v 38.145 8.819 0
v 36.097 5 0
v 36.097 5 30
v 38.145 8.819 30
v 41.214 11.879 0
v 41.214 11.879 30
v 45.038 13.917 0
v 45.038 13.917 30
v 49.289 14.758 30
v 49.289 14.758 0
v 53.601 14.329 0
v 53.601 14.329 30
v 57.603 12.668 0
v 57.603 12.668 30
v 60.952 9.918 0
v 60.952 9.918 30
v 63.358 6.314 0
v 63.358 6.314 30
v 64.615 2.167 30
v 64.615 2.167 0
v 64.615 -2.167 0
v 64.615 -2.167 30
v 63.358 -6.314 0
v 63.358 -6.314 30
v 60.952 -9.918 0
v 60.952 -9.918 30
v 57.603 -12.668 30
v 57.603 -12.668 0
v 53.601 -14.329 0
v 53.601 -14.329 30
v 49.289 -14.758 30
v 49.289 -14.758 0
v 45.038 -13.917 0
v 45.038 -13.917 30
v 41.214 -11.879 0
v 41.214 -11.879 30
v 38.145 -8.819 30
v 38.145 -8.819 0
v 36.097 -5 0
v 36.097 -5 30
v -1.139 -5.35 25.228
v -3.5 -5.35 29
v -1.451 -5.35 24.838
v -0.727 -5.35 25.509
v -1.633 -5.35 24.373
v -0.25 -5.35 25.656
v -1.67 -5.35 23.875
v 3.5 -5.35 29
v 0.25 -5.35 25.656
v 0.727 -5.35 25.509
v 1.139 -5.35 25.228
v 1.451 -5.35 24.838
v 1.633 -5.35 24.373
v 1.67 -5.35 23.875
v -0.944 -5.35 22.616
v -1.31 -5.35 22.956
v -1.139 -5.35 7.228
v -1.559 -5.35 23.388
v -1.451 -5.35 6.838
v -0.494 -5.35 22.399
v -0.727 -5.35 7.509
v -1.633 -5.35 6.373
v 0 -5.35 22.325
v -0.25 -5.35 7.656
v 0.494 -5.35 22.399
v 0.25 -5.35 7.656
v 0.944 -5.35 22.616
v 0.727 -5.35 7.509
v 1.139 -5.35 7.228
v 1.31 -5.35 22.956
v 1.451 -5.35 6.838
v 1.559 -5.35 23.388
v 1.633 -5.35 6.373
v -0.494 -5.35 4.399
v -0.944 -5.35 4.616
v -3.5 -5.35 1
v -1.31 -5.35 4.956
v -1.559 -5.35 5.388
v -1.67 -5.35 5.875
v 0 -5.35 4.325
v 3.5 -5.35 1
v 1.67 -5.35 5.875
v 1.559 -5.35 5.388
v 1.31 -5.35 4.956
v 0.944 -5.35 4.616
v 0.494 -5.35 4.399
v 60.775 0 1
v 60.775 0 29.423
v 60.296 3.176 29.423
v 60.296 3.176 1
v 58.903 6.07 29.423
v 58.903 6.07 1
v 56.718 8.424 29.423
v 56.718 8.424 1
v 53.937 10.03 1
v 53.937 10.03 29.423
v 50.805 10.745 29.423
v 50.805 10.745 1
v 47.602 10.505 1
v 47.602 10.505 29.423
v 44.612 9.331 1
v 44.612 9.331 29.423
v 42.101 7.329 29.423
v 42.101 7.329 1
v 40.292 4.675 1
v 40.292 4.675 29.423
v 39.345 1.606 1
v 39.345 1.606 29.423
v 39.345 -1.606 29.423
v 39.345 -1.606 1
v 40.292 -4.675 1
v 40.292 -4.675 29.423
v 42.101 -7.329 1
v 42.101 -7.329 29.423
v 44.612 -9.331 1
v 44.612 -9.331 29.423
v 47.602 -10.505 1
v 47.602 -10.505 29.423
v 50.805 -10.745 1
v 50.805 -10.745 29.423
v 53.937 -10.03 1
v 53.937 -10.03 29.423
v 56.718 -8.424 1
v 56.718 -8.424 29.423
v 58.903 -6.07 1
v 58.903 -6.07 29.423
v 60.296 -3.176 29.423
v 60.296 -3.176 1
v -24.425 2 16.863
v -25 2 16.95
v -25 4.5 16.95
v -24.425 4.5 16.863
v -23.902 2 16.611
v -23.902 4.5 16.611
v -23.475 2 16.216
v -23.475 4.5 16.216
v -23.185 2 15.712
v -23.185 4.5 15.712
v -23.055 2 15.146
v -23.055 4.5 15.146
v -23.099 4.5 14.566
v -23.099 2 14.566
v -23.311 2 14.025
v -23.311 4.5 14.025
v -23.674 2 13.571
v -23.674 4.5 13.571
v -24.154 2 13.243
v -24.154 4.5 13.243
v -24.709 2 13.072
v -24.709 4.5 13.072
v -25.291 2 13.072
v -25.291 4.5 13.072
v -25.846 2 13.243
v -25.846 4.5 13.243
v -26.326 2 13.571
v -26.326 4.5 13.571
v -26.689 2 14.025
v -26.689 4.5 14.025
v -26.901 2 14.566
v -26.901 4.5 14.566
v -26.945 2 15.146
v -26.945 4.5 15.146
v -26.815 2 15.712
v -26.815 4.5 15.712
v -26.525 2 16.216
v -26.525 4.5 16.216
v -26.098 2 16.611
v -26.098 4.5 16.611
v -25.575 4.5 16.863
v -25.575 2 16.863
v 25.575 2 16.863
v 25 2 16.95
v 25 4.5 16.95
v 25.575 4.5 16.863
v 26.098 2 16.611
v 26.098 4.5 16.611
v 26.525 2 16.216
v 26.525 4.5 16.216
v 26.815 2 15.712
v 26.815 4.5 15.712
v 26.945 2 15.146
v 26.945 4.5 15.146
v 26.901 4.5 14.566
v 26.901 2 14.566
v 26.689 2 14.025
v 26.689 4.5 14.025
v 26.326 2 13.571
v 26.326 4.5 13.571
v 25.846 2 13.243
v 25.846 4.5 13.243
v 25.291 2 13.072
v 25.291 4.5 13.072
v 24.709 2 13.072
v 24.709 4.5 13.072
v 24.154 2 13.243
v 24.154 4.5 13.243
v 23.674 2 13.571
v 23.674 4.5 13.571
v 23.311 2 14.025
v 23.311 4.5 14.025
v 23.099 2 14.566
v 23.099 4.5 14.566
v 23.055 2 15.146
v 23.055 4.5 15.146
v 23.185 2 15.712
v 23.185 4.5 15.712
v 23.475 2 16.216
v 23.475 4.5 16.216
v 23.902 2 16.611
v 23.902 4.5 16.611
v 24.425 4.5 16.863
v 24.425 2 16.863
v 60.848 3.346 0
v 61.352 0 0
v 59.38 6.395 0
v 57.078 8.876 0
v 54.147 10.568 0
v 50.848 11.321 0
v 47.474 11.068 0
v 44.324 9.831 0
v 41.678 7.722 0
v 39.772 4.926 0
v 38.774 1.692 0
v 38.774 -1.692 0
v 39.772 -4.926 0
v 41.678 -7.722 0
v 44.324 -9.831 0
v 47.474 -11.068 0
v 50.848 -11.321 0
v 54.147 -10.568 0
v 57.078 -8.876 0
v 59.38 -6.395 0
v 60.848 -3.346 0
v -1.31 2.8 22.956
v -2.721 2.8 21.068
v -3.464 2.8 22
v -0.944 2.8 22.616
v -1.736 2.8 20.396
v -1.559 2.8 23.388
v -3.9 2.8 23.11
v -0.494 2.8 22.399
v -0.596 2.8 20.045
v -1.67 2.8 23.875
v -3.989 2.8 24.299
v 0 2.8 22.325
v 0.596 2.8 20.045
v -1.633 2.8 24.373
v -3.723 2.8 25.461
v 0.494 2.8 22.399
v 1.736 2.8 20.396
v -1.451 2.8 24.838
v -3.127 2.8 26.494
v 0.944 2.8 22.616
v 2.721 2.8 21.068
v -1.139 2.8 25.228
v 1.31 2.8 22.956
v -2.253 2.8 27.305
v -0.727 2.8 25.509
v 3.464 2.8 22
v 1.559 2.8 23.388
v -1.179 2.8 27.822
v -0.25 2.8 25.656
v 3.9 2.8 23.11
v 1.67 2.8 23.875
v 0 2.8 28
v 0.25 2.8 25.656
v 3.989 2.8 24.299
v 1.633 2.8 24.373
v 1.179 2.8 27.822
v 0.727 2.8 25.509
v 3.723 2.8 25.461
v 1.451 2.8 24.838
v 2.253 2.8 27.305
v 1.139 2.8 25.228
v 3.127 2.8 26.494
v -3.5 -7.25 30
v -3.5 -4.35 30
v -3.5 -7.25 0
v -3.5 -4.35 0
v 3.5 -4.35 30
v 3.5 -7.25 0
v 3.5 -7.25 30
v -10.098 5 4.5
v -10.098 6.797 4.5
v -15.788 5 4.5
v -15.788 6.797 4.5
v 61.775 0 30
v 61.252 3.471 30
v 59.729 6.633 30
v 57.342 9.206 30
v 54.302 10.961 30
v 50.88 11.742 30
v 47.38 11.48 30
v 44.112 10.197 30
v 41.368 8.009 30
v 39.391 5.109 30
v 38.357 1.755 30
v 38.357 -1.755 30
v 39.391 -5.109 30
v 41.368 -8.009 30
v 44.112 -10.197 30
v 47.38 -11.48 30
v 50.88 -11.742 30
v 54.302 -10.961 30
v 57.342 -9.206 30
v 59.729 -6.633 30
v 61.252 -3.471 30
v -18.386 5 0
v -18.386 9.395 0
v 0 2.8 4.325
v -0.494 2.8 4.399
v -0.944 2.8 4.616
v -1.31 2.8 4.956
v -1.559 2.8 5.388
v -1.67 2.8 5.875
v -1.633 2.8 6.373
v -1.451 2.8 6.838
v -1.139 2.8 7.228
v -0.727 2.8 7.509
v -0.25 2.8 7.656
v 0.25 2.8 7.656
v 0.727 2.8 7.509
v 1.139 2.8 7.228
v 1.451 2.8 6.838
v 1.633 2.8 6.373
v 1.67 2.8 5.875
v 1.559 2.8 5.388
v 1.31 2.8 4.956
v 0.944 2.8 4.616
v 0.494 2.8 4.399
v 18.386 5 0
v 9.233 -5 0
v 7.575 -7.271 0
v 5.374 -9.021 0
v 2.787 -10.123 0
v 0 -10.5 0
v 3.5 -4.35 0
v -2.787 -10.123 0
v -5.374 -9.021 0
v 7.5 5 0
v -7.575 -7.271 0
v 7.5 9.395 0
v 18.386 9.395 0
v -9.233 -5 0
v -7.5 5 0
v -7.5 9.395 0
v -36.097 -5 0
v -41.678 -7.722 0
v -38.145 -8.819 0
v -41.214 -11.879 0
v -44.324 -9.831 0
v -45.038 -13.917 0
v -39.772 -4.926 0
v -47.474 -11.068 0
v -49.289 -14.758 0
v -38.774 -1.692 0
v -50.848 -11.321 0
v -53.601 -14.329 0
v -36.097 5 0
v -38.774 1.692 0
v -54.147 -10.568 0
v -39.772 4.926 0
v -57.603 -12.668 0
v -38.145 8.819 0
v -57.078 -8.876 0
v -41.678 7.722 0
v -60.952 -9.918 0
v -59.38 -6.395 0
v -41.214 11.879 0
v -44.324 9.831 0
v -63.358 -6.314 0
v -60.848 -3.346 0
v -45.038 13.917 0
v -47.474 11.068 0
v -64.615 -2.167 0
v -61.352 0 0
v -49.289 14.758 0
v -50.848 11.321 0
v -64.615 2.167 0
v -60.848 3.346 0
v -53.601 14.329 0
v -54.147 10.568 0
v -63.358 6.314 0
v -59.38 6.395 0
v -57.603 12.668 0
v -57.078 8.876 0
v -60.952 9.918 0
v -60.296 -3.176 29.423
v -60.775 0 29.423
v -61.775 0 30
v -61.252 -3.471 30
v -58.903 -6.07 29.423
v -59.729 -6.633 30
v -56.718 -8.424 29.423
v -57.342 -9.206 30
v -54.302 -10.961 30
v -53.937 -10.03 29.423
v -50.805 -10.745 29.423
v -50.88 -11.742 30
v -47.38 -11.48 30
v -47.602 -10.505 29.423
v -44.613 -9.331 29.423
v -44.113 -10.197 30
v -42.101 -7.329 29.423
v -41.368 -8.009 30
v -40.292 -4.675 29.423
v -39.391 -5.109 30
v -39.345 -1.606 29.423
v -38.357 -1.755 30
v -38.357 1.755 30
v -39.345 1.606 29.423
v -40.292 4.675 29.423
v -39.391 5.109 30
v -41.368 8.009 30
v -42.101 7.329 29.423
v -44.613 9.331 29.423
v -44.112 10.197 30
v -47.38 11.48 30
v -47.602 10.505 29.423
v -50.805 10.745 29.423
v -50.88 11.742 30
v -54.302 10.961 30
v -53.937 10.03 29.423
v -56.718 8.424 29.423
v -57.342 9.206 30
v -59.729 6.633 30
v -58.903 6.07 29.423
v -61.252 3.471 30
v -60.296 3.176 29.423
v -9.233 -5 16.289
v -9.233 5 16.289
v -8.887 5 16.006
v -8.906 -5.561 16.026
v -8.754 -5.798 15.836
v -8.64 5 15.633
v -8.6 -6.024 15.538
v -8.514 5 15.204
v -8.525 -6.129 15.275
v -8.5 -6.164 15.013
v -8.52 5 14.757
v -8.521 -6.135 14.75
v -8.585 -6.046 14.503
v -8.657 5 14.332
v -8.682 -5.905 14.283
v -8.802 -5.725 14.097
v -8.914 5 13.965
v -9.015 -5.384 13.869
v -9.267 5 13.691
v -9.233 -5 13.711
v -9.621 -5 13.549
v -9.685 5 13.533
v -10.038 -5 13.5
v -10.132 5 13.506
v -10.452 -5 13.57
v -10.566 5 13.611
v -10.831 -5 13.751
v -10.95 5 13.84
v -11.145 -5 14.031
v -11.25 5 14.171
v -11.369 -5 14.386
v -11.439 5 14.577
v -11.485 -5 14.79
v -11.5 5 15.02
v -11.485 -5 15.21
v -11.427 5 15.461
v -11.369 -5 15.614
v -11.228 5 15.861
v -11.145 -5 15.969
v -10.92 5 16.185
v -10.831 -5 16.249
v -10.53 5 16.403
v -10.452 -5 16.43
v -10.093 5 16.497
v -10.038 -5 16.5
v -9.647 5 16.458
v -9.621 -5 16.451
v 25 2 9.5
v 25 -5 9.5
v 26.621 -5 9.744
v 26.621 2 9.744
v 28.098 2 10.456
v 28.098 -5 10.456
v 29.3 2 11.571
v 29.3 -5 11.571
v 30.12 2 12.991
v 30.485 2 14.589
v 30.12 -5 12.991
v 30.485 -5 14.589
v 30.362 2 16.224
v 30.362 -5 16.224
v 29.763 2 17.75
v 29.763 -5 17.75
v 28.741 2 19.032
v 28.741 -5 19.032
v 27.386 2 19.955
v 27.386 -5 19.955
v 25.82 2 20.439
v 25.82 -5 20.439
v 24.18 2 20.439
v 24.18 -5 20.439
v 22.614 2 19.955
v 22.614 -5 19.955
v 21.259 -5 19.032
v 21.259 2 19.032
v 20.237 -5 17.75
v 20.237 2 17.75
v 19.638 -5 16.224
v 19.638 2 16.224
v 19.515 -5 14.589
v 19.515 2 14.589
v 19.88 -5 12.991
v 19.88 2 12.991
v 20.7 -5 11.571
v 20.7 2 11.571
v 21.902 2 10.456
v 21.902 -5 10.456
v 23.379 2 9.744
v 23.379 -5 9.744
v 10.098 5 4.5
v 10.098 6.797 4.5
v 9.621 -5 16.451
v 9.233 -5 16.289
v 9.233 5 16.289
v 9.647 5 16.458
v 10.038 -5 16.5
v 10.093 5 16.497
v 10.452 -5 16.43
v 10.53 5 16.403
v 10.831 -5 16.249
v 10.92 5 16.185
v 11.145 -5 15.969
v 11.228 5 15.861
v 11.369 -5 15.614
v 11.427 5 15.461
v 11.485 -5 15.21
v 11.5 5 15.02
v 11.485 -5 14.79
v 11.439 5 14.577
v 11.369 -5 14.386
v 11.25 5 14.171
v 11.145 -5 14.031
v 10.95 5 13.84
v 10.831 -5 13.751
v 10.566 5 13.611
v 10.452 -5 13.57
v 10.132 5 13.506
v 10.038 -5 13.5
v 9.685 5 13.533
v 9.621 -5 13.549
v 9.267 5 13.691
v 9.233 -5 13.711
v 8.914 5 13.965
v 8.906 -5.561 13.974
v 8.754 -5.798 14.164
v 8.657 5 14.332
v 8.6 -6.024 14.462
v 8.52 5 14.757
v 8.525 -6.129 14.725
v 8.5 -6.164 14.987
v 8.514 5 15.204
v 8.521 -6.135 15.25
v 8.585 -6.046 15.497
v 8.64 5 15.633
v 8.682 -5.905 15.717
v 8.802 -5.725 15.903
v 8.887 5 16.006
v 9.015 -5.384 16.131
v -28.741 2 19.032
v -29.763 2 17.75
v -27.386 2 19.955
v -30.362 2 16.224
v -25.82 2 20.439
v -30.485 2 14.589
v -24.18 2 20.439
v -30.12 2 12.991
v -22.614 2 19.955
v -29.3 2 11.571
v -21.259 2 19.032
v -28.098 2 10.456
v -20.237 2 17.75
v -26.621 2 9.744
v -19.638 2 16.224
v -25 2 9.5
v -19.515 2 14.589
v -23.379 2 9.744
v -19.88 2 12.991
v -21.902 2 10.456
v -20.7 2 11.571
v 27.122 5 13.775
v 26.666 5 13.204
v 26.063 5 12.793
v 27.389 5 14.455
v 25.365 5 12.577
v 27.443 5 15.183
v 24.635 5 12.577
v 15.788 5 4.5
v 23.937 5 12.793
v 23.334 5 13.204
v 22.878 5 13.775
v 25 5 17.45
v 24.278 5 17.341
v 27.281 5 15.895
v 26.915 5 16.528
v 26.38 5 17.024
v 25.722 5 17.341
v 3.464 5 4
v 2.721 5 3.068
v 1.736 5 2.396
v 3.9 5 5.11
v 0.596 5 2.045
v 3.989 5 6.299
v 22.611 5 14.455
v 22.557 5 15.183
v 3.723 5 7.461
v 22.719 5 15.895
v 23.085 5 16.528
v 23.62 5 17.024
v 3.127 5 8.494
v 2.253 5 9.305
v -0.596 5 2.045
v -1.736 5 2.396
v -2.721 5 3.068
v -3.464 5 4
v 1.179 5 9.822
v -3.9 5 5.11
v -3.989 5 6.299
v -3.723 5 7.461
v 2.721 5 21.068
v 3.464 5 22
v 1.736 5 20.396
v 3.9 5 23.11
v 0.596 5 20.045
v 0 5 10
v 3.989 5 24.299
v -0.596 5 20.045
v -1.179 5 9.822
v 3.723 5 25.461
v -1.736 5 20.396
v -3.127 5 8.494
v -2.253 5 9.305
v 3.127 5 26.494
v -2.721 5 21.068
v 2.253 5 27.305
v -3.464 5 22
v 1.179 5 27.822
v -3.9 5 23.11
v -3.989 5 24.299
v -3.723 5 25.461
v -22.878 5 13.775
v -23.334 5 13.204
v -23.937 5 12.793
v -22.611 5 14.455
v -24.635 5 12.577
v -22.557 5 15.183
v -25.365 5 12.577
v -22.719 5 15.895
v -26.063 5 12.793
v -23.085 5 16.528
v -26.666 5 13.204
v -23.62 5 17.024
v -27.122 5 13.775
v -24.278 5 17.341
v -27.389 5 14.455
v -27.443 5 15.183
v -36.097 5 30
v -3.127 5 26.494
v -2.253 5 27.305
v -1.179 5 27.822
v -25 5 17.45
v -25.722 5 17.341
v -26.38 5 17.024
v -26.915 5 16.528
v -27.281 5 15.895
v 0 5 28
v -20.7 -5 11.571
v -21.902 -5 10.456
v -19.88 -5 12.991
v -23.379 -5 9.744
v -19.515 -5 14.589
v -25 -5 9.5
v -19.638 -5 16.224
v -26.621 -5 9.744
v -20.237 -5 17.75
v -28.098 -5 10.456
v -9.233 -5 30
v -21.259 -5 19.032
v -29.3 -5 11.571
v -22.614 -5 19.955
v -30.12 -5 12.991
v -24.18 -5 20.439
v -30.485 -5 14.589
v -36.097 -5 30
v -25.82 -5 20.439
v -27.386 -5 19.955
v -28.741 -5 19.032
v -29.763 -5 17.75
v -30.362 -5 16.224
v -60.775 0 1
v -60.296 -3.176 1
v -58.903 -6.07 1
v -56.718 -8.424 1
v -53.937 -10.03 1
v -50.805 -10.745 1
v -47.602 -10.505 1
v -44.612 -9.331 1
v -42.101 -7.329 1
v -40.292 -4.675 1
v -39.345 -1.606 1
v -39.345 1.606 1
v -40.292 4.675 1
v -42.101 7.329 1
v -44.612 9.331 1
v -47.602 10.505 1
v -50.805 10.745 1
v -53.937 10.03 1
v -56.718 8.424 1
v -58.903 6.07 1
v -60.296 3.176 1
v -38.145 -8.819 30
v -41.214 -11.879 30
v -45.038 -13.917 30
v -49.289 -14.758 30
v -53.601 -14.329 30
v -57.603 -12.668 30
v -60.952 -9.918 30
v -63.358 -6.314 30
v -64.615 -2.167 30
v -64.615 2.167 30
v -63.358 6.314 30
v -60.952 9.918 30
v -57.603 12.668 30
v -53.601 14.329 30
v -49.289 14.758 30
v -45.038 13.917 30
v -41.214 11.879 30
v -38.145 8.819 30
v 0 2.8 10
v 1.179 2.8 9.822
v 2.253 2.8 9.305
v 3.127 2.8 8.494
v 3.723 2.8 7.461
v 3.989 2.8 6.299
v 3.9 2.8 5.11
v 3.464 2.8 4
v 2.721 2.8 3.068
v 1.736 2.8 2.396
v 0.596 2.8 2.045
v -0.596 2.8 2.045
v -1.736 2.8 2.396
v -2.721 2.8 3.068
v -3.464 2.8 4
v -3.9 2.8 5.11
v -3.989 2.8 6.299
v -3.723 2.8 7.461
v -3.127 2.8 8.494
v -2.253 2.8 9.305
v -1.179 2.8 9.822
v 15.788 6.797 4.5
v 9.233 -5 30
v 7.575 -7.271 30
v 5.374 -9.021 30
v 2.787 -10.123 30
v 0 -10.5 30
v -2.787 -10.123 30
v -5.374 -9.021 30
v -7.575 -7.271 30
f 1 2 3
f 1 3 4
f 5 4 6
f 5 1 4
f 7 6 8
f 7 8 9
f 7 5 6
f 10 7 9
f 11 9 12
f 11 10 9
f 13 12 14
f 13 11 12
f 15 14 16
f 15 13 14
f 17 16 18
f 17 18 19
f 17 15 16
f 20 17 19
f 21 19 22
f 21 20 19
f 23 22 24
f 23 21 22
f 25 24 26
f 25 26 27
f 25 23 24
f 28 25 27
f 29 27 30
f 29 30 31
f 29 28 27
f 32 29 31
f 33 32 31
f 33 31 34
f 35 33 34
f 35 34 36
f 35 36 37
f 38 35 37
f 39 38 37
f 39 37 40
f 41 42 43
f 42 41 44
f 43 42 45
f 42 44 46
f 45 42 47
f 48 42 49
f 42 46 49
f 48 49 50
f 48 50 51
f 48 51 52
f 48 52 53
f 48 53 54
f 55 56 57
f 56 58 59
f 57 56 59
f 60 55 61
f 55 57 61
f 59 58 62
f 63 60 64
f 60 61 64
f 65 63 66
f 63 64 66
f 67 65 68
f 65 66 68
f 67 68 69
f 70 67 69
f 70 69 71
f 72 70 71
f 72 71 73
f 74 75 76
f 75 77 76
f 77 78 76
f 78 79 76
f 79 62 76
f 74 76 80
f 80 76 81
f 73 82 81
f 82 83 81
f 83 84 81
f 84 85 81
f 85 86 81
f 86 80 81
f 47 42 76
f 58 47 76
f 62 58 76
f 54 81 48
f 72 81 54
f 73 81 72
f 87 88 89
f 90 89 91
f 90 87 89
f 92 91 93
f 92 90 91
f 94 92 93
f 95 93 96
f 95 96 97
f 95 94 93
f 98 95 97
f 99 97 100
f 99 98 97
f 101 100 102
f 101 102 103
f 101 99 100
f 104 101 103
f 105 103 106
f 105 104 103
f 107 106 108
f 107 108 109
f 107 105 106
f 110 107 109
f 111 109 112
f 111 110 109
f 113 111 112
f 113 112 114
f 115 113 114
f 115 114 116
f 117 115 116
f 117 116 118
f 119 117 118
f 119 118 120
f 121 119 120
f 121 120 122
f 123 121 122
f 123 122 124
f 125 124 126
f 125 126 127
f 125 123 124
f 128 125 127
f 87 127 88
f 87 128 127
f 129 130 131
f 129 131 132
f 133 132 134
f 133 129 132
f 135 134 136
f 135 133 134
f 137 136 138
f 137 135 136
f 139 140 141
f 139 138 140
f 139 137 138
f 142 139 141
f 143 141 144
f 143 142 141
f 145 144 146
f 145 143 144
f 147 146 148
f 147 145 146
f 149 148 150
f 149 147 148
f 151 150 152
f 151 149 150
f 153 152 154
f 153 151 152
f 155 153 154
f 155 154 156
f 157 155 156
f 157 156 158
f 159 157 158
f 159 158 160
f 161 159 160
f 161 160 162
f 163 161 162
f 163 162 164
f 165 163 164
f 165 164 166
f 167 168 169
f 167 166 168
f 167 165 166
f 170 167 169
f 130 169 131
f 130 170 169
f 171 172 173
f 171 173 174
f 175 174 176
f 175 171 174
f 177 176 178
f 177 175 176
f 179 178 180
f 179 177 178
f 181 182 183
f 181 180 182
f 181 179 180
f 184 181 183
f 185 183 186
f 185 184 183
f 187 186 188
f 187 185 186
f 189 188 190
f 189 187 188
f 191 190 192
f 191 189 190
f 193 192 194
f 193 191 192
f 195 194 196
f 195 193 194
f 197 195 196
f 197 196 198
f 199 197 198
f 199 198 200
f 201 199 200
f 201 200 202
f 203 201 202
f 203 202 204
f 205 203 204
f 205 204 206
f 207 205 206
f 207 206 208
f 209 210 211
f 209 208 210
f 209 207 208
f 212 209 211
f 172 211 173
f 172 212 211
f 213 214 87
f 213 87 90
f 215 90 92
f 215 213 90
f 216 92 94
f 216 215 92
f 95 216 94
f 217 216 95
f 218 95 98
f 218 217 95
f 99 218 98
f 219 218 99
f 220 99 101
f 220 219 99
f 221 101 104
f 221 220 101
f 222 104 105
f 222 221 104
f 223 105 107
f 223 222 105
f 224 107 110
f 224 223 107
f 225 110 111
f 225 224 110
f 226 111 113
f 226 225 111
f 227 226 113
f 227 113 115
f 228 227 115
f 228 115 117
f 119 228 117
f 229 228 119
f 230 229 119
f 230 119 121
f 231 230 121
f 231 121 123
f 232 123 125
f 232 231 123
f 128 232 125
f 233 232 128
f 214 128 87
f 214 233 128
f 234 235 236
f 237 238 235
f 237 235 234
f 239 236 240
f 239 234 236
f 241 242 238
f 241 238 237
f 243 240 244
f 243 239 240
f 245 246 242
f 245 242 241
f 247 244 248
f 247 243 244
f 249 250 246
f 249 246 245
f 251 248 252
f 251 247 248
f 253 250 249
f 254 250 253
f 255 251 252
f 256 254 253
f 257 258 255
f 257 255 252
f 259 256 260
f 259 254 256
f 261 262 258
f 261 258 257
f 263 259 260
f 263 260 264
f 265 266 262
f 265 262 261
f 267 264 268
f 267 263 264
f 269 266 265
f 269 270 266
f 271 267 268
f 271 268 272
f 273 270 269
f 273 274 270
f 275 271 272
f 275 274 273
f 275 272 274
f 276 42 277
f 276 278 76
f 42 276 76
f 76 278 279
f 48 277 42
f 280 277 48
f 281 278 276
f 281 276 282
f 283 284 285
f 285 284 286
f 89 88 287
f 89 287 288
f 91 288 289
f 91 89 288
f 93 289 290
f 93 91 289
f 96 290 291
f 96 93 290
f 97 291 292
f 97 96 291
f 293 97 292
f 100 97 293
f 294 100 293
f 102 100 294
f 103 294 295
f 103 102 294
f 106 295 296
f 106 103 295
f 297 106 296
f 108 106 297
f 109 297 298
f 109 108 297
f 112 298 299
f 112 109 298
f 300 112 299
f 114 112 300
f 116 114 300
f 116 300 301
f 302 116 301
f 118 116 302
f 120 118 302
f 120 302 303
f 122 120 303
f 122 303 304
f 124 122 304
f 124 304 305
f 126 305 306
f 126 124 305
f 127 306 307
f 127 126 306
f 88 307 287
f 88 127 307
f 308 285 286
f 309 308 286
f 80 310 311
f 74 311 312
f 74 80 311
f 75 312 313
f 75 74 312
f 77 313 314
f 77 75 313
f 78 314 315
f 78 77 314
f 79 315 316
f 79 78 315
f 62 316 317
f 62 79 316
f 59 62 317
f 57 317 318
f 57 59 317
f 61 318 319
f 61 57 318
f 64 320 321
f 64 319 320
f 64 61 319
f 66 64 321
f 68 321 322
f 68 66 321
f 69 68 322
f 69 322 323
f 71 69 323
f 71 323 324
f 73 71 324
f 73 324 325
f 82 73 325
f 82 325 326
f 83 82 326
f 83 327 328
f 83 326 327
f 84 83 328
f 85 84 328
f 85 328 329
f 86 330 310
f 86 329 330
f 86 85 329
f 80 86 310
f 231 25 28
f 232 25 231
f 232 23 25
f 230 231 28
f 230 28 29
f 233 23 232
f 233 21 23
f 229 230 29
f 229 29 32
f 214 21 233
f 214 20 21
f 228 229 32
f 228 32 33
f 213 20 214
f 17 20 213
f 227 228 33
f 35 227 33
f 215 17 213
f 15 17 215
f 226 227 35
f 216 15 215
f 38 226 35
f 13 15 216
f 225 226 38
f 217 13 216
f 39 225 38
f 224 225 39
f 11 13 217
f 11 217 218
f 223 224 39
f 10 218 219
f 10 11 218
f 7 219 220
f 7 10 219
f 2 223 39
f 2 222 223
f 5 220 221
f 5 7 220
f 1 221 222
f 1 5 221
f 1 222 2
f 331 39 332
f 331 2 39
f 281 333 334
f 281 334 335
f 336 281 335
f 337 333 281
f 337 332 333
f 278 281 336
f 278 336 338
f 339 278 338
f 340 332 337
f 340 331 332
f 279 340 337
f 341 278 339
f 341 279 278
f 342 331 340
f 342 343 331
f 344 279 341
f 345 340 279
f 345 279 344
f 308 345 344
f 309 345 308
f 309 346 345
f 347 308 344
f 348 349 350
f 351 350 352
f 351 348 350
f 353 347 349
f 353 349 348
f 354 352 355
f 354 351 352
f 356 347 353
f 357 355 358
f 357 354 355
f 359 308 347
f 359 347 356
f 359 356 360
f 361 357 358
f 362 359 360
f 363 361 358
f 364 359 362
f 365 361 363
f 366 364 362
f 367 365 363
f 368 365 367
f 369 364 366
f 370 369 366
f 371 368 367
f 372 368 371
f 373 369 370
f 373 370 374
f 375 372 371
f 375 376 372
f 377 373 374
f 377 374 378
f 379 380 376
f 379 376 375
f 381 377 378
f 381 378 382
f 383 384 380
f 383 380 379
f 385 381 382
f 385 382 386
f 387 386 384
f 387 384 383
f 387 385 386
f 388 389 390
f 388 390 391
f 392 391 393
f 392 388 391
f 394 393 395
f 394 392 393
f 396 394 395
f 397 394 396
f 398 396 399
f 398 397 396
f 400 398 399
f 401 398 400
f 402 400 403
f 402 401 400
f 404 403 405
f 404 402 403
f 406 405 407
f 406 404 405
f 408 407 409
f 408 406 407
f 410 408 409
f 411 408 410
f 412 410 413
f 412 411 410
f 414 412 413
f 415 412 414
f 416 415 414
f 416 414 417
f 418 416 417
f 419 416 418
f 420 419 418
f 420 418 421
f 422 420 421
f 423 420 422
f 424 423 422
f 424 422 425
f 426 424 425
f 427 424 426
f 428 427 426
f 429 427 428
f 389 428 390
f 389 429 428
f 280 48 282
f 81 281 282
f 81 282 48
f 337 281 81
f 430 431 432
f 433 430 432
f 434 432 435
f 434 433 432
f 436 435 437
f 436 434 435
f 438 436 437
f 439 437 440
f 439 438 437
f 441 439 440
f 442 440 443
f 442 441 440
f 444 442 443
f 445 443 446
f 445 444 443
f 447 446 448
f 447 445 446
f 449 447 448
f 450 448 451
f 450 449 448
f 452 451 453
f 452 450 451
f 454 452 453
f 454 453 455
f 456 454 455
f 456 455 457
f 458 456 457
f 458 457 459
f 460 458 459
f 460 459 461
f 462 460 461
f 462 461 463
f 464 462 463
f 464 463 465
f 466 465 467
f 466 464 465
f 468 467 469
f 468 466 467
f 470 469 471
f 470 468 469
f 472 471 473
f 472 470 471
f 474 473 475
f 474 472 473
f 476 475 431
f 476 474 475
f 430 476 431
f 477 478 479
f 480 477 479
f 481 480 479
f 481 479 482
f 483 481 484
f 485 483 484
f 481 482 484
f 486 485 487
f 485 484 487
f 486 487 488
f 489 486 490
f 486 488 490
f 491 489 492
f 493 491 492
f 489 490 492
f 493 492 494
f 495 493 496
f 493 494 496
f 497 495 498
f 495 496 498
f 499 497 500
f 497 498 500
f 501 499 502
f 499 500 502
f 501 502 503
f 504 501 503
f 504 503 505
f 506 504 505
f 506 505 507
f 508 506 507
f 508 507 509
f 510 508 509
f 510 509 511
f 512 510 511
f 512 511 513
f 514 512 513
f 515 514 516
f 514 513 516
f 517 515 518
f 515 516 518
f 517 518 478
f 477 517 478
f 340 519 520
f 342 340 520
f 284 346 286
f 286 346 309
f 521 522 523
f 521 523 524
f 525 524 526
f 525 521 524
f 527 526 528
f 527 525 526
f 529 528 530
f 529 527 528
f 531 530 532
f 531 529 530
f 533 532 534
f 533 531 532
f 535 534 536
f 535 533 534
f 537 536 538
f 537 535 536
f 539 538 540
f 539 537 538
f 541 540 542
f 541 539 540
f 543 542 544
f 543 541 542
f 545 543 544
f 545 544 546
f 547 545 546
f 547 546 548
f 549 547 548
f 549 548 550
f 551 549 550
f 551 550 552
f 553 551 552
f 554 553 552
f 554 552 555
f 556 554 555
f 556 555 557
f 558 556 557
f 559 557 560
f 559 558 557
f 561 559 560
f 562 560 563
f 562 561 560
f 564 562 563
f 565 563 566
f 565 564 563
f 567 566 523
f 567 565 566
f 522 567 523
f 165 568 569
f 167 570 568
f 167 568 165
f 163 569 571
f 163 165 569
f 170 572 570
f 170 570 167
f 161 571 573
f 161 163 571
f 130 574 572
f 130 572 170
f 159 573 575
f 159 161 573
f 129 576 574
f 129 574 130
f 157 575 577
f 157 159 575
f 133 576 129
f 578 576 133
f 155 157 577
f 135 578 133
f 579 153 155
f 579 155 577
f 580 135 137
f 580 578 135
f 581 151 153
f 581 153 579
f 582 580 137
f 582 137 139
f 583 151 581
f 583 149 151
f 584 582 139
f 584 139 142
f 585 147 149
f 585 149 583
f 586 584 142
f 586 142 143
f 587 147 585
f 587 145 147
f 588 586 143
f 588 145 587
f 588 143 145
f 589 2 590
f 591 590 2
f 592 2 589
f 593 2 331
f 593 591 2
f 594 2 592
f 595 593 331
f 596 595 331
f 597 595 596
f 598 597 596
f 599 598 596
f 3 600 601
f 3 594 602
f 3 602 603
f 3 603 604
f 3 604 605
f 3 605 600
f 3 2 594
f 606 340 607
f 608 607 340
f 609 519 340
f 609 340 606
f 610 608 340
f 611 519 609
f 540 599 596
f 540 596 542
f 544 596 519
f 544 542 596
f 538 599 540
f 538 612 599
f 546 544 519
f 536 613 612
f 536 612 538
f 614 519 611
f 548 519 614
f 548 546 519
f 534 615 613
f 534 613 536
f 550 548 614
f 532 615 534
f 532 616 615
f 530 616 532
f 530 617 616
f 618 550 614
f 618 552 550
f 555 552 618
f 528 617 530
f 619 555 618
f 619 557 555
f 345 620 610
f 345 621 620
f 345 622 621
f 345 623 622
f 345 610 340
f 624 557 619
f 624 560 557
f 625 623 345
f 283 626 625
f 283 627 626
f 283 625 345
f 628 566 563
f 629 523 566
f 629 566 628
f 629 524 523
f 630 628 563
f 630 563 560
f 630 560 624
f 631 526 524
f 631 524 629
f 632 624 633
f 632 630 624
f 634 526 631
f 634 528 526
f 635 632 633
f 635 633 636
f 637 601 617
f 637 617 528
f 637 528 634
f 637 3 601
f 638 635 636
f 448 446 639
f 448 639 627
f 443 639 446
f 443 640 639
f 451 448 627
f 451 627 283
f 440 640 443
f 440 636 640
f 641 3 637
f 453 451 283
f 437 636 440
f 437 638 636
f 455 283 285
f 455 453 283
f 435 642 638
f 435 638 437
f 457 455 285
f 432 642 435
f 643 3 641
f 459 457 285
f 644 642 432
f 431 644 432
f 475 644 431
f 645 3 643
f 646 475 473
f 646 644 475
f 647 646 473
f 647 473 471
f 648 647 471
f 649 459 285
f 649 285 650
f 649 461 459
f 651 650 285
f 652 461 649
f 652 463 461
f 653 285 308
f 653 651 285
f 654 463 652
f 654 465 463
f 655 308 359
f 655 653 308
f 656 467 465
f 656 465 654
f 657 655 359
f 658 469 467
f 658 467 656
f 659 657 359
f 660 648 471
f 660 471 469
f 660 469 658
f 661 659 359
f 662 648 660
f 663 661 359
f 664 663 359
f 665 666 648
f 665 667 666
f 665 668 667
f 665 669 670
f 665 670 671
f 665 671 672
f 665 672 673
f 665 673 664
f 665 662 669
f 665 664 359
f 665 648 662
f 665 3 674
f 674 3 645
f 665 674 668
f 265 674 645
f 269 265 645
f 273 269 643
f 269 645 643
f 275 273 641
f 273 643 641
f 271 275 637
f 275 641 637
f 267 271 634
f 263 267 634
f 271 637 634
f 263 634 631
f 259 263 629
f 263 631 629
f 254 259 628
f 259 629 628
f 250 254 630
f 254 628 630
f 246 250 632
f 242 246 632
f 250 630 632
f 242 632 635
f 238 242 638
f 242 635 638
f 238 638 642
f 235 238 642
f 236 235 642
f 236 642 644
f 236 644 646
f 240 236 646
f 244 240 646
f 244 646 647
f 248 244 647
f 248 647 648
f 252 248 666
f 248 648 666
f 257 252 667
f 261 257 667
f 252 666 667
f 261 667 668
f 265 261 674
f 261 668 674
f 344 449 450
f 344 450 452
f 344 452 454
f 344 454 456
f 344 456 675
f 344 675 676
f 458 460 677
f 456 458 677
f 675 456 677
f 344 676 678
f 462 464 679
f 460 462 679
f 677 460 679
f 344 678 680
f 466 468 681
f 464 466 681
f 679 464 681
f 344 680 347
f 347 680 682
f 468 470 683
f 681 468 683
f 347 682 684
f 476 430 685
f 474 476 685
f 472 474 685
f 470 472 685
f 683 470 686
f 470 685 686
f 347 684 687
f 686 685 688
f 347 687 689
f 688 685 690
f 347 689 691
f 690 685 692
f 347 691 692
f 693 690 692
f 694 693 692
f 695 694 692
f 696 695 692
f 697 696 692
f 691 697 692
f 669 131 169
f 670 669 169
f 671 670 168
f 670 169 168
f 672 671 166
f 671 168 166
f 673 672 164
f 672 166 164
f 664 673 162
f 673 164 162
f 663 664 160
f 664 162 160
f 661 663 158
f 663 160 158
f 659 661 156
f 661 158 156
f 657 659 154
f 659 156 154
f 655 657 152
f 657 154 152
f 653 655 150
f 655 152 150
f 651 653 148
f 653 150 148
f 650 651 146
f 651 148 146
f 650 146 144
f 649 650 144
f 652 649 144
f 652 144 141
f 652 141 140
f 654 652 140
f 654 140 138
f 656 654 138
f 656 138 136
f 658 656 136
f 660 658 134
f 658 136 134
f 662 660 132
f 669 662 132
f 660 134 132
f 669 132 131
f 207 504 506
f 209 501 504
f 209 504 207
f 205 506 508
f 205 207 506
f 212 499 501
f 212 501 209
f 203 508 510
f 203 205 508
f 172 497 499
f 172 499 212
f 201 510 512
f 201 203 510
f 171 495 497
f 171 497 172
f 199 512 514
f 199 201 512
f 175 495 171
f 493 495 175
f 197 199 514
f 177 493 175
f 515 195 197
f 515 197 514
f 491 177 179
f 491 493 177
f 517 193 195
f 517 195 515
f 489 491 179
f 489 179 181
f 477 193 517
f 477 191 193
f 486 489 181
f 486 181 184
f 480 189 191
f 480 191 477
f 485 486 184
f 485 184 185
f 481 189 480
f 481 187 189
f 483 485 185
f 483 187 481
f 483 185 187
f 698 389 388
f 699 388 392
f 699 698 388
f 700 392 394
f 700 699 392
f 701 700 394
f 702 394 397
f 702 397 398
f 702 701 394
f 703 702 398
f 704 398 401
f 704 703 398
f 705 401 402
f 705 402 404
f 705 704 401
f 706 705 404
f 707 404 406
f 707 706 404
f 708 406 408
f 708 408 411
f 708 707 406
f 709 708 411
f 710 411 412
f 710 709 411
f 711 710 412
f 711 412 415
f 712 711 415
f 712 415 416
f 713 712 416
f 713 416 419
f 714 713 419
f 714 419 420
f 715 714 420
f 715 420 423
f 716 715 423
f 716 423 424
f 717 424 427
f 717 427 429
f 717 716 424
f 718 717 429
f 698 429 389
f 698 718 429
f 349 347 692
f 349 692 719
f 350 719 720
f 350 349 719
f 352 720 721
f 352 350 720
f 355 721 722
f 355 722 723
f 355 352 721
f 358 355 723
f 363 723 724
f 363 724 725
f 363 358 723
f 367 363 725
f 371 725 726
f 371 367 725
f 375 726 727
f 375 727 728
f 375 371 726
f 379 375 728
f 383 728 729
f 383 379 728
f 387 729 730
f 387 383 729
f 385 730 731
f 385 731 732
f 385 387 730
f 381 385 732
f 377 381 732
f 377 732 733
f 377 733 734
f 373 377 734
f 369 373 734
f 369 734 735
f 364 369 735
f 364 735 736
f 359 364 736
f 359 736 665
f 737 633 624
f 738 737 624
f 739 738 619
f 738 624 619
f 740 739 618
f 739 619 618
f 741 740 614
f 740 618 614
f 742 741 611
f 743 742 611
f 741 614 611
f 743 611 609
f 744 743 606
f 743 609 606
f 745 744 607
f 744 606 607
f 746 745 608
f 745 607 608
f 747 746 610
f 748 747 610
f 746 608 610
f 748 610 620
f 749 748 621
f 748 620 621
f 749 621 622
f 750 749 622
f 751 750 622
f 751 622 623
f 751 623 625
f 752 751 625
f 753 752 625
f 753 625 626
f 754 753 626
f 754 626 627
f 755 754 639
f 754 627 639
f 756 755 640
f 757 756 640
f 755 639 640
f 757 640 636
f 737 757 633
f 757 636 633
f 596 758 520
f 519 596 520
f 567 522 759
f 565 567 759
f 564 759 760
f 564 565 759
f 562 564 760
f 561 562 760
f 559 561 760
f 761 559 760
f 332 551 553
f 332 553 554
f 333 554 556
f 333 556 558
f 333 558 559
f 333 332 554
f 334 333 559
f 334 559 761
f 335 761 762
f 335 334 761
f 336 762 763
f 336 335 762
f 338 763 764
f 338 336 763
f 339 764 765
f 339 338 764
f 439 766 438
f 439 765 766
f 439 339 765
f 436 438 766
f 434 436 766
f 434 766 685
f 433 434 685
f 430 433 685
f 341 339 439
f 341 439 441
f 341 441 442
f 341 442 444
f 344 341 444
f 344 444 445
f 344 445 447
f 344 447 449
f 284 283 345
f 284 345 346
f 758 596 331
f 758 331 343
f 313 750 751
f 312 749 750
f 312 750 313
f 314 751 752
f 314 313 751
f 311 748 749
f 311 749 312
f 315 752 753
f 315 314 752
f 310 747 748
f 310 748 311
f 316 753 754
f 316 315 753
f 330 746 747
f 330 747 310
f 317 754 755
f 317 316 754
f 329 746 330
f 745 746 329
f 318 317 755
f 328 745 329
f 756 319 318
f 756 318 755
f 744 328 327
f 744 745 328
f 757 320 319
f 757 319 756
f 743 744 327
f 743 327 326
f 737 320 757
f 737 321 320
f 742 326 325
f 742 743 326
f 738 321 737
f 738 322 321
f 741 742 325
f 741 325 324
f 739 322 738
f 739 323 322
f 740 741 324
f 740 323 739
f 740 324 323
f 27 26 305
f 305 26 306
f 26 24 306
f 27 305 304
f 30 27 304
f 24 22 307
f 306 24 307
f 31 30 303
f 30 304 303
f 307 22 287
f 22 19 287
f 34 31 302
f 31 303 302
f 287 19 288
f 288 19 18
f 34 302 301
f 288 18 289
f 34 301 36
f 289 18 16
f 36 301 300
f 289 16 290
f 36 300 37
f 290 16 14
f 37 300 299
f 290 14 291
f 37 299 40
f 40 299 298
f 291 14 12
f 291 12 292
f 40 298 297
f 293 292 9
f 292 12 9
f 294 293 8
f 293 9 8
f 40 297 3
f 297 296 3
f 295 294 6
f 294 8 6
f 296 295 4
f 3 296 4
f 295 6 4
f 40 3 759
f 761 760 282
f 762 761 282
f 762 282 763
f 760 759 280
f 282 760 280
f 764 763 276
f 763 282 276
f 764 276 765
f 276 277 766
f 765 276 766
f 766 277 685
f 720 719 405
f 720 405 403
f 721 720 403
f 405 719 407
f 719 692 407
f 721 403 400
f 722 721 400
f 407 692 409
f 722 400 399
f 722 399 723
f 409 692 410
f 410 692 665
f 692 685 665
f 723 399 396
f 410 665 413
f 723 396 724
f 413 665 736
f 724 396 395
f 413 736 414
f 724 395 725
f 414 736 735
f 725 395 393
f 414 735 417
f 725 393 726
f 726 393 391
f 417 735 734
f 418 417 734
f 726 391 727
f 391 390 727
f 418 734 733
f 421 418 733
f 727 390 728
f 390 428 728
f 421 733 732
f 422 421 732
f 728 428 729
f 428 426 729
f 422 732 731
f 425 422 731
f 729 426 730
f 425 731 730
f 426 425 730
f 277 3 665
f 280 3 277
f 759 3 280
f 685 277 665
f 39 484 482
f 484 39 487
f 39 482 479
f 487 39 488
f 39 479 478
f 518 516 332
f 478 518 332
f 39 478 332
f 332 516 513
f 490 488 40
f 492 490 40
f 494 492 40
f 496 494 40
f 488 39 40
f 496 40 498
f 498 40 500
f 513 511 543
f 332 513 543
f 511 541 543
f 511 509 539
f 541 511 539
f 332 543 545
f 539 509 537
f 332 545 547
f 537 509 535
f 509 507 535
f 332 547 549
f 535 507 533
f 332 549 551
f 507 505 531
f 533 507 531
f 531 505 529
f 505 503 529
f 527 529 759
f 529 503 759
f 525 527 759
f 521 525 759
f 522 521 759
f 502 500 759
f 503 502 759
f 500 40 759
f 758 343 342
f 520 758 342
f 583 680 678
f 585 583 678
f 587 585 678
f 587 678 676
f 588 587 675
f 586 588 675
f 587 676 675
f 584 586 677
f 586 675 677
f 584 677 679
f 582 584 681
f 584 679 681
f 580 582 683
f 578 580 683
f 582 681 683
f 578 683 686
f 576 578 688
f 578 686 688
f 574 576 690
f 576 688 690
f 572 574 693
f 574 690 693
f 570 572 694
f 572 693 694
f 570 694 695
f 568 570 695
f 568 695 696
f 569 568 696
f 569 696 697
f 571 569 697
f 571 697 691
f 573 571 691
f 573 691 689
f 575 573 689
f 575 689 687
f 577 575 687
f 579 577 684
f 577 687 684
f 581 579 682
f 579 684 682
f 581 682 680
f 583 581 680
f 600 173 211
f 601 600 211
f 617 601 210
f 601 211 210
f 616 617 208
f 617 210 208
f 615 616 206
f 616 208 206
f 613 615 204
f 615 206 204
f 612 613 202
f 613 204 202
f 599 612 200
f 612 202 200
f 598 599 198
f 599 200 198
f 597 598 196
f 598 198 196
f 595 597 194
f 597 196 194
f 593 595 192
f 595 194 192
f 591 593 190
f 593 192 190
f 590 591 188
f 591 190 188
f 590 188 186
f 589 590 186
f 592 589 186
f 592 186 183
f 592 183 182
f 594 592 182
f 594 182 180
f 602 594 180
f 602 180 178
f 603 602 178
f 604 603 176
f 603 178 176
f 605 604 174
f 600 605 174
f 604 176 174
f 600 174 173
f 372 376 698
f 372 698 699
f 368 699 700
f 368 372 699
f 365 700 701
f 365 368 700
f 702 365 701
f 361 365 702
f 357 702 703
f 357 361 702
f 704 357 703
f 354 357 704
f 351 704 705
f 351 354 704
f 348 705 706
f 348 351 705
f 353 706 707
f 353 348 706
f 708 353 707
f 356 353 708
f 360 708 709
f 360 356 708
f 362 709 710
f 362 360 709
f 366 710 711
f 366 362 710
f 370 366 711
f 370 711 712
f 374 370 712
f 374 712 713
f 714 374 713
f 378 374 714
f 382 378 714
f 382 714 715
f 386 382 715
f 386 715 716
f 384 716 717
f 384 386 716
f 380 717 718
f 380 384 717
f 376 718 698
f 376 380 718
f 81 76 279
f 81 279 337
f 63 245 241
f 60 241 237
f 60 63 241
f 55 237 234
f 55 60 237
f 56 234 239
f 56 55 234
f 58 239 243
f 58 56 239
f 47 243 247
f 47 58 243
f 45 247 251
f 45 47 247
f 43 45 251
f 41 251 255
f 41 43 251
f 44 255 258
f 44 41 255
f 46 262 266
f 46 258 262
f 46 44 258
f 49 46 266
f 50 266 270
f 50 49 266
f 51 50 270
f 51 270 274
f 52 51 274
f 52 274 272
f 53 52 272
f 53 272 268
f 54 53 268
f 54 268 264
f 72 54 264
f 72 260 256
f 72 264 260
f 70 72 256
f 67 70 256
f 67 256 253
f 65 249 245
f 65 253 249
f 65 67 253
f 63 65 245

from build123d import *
from OCP.BRepFilletAPI import BRepFilletAPI_MakeChamfer

# Parameters (mm, degrees)
SKETCH1_R                     = 10.775
SKETCH1_W                     = 7
SKETCH1_H                     = 1.9
BOSS_EXTRUDE1_DEPTH           = 30
BOSS_EXTRUDE4_DEPTH           = 5
BOSS_EXTRUDE4_DEPTH_BACK      = 5
SKETCH30_R                    = 1.675
CUT_EXTRUDE14_DEPTH           = 75.167487823
SKETCH31_R                    = 4
CUT_EXTRUDE15_DEPTH           = 2.2
CHAMFER1_SIZE                 = 1
SKETCH42_W                    = 10.885616931
SKETCH42_H                    = 7.232184452
BOSS_EXTRUDE6_DEPTH           = 4.5
BOSS_EXTRUDE6_DRAFT           = -30
BOSS_EXTRUDE6_PROFILE_2_DEPTH = 4.5
BOSS_EXTRUDE6_PROFILE_2_DRAFT = -30
CUT_EXTRUDE16_DEPTH           = 73.897882342
CUT_EXTRUDE16_DEPTH_BACK      = 73.897882342
SKETCH43_R                    = 1.95
SKETCH43_R_2                  = 1.5
CHAMFER2_SIZE                 = 0.5
CHAMFER3_SIZE                 = 1
CHAMFER3_SIZE2                = 0.577350269
SKETCH44_R                    = 5.5
CUT_EXTRUDE17_DEPTH           = 7


with BuildPart() as part:
    # Sketch1 → Boss-Extrude1 (new body)
    with BuildSketch(Plane.XY):
        with BuildLine():
            Line((-33.091348368, 2.425), (33.073098334, 2.425))
            ThreePointArc((33.073098334, 2.425), (34.841312767, 3.001486492), (35.929959375, 4.509388186))
            ThreePointArc((35.929959375, 4.509388186), (64.775, 0), (35.929959375, -4.509388186))
            ThreePointArc((35.929959375, -4.509388186), (34.841312767, -3.001486492), (33.073098334, -2.425))
            Line((33.073098334, -2.425), (12.362013388, -2.425))
            ThreePointArc((12.362013388, -2.425), (10.721383427, -2.913360429), (9.614899302, -4.219444444))
            ThreePointArc((9.614899302, -4.219444444), (-0.006360753, -10.499998073), (-9.620004404, -4.207792208))
            ThreePointArc((-9.620004404, -4.207792208), (-10.717205737, -2.910276804), (-12.345672319, -2.425))
            Line((-12.345672319, -2.425), (-33.091348368, -2.425))
            ThreePointArc((-33.091348368, -2.425), (-34.84606209, -2.99758356), (-35.925333642, -4.494929577))
            ThreePointArc((-35.925333642, -4.494929577), (-64.775, 0), (-35.925333642, 4.494929577))
            ThreePointArc((-35.925333642, 4.494929577), (-34.84606209, 2.99758356), (-33.091348368, 2.425))
        make_face()
        with Locations((50, 0)):
            Circle(SKETCH1_R, mode=Mode.SUBTRACT)
        with Locations((-50, 0)):
            Circle(SKETCH1_R, mode=Mode.SUBTRACT)
        with Locations((0, -6.3)):
            Rectangle(SKETCH1_W, SKETCH1_H, mode=Mode.SUBTRACT)
    extrude(amount=BOSS_EXTRUDE1_DEPTH)

    # Sketch32 → Boss-Extrude4 (add, two sides: drawn at the far end of the back side and taken through both)
    with BuildSketch(Plane.XZ.offset(-BOSS_EXTRUDE4_DEPTH_BACK)):
        Polygon((-38.661098901, 30), (7.988715583, 30), (38.752094408, 30), (38.752094408, 0), (7.988715583, 0), (-38.661098901, 0), align=None)
    extrude(amount=BOSS_EXTRUDE4_DEPTH + BOSS_EXTRUDE4_DEPTH_BACK)

    # Sketch30 → Cut-Extrude14 (cut, through all)
    with BuildSketch(Plane(origin=(0, -5.35, 0), x_dir=(1, 0, 0), z_dir=(0, 1, 0))):
        with Locations((0, -6)):
            Circle(SKETCH30_R)
        with Locations((0, -24)):
            Circle(SKETCH30_R)
    extrude(amount=CUT_EXTRUDE14_DEPTH, mode=Mode.SUBTRACT)

    # Sketch31 → Cut-Extrude15 (cut)
    with BuildSketch(Plane(origin=(0, 5, 0), x_dir=(1, 0, 0), z_dir=(0, 1, 0))):
        with Locations((0, -6)):
            Circle(SKETCH31_R)
        with Locations((0, -24)):
            Circle(SKETCH31_R)
    extrude(amount=-CUT_EXTRUDE15_DEPTH, mode=Mode.SUBTRACT)

    # Chamfer1
    chamfer1_edges = [part.edges().sort_by_distance(p)[0] for p in [
        (0, -5.35, 30),
        (0, -5.35, 0),
    ]]
    chamfer(chamfer1_edges, length=CHAMFER1_SIZE)


with BuildPart() as boss_extrude6_tool:
    # Sketch42 → Boss-Extrude6 (with draft: the straight prism first)
    with BuildSketch(Plane(origin=(0, 0, 0), x_dir=(-1, 0, 0), z_dir=(0, 0, -1))):
        with Locations((-12.942808466, 5.778527688)):
            Rectangle(SKETCH42_W, SKETCH42_H)
    extrude(amount=-BOSS_EXTRUDE6_DEPTH)
    # Boss-Extrude6: the draft: its side faces are tilted about the plane it starts from
    boss_extrude6_sides = [boss_extrude6_tool.faces().sort_by_distance(p)[0] for p in [
        (7.5, 5.778527688, 2.25),
        (12.942808466, 9.394619914, 2.25),
        (18.385616931, 5.778527688, 2.25),
        (12.942808466, 2.162435462, 2.25),
    ]]
    draft(boss_extrude6_sides, Plane(origin=(0, 0, 0), x_dir=(-1, 0, 0), z_dir=(0, 0, -1)), BOSS_EXTRUDE6_DRAFT)


with BuildPart() as part_1:
    add(part.part)

    # Boss-Extrude6: add boss_extrude6_tool
    add(boss_extrude6_tool.part)


with BuildPart() as boss_extrude6_profile_2_tool:
    # Sketch42 → Boss-Extrude6 profile 2 (with draft: the straight prism first)
    with BuildSketch(Plane(origin=(0, 0, 0), x_dir=(-1, 0, 0), z_dir=(0, 0, -1))):
        with Locations((12.942808466, 5.778527688)):
            Rectangle(SKETCH42_W, SKETCH42_H)
    extrude(amount=-BOSS_EXTRUDE6_PROFILE_2_DEPTH)
    # Boss-Extrude6 profile 2: the draft: its side faces are tilted about the plane it starts from
    boss_extrude6_profile_2_sides = [boss_extrude6_profile_2_tool.faces().sort_by_distance(p)[0] for p in [
        (-18.385616931, 5.778527688, 2.25),
        (-12.942808466, 9.394619914, 2.25),
        (-7.5, 5.778527688, 2.25),
        (-12.942808466, 2.162435462, 2.25),
    ]]
    draft(boss_extrude6_profile_2_sides, Plane(origin=(0, 0, 0), x_dir=(-1, 0, 0), z_dir=(0, 0, -1)), BOSS_EXTRUDE6_PROFILE_2_DRAFT)


with BuildPart() as part_2:
    add(part_1.part)

    # Boss-Extrude6 profile 2: add boss_extrude6_profile_2_tool
    add(boss_extrude6_profile_2_tool.part)

    # Sketch43 → Cut-Extrude16 (cut, two sides: drawn at the far end of the back side and taken through both)
    with BuildSketch(Plane(origin=(0, 0, 0), x_dir=(1, 0, 0), z_dir=(0, 1, 0)).offset(-CUT_EXTRUDE16_DEPTH_BACK)):
        with Locations((25, -15)):
            Circle(SKETCH43_R)
        with Locations((-25, -15)):
            Circle(SKETCH43_R)
        with Locations((10, -15)):
            Circle(SKETCH43_R_2)
        with Locations((-10, -15)):
            Circle(SKETCH43_R_2)
    extrude(amount=CUT_EXTRUDE16_DEPTH + CUT_EXTRUDE16_DEPTH_BACK, mode=Mode.SUBTRACT)

    # Chamfer2
    chamfer2_edges = [part_2.edges().sort_by_distance(p)[0] for p in [
        (23.05, 5, 15),
        (-26.95, 5, 15),
    ]]
    chamfer(chamfer2_edges, length=CHAMFER2_SIZE)

    # Chamfer3: one chamfer whose edges measure the first distance from different faces: ONE call of the kernel's chamfer builder (chamfer() names one face for all edges)
    chamfer3_edges_1 = [part_2.edges().sort_by_distance(p)[0] for p in [
        (-60.775, 0, 30),
        (39.225, 0, 30),
    ]]
    chamfer3_side_1 = [part_2.faces().sort_by_distance(p)[0] for p in [
        (0, -0.289813178, 30),
    ]]
    chamfer3_edges_2 = [part_2.edges().sort_by_distance(p)[0] for p in [
        (39.225, 0, 0),
    ]]
    chamfer3_side_2 = [part_2.faces().sort_by_distance(p)[0] for p in [
        (39.225, 0, 15),
    ]]
    chamfer3_edges_3 = [part_2.edges().sort_by_distance(p)[0] for p in [
        (-60.775, 0, 0),
    ]]
    chamfer3_side_3 = [part_2.faces().sort_by_distance(p)[0] for p in [
        (-60.775, 0, 15),
    ]]
    chamfer3 = BRepFilletAPI_MakeChamfer(part_2.part.solid().wrapped)
    for e in chamfer3_edges_1:
        chamfer3.Add(CHAMFER3_SIZE, CHAMFER3_SIZE2, e.wrapped, chamfer3_side_1[0].wrapped)  # the first distance lies on this face
    for e in chamfer3_edges_2:
        chamfer3.Add(CHAMFER3_SIZE, CHAMFER3_SIZE2, e.wrapped, chamfer3_side_2[0].wrapped)  # the first distance lies on this face
    for e in chamfer3_edges_3:
        chamfer3.Add(CHAMFER3_SIZE, CHAMFER3_SIZE2, e.wrapped, chamfer3_side_3[0].wrapped)  # the first distance lies on this face
    add(Compound.cast(chamfer3.Shape()), mode=Mode.REPLACE)

    # Sketch44 → Cut-Extrude17 (cut)
    with BuildSketch(Plane.XZ.offset(5)):
        with Locations((25, 15)):
            Circle(SKETCH44_R)
        with Locations((-25, 15)):
            Circle(SKETCH44_R)
    extrude(amount=-CUT_EXTRUDE17_DEPTH, mode=Mode.SUBTRACT)


solid = part_2.part
